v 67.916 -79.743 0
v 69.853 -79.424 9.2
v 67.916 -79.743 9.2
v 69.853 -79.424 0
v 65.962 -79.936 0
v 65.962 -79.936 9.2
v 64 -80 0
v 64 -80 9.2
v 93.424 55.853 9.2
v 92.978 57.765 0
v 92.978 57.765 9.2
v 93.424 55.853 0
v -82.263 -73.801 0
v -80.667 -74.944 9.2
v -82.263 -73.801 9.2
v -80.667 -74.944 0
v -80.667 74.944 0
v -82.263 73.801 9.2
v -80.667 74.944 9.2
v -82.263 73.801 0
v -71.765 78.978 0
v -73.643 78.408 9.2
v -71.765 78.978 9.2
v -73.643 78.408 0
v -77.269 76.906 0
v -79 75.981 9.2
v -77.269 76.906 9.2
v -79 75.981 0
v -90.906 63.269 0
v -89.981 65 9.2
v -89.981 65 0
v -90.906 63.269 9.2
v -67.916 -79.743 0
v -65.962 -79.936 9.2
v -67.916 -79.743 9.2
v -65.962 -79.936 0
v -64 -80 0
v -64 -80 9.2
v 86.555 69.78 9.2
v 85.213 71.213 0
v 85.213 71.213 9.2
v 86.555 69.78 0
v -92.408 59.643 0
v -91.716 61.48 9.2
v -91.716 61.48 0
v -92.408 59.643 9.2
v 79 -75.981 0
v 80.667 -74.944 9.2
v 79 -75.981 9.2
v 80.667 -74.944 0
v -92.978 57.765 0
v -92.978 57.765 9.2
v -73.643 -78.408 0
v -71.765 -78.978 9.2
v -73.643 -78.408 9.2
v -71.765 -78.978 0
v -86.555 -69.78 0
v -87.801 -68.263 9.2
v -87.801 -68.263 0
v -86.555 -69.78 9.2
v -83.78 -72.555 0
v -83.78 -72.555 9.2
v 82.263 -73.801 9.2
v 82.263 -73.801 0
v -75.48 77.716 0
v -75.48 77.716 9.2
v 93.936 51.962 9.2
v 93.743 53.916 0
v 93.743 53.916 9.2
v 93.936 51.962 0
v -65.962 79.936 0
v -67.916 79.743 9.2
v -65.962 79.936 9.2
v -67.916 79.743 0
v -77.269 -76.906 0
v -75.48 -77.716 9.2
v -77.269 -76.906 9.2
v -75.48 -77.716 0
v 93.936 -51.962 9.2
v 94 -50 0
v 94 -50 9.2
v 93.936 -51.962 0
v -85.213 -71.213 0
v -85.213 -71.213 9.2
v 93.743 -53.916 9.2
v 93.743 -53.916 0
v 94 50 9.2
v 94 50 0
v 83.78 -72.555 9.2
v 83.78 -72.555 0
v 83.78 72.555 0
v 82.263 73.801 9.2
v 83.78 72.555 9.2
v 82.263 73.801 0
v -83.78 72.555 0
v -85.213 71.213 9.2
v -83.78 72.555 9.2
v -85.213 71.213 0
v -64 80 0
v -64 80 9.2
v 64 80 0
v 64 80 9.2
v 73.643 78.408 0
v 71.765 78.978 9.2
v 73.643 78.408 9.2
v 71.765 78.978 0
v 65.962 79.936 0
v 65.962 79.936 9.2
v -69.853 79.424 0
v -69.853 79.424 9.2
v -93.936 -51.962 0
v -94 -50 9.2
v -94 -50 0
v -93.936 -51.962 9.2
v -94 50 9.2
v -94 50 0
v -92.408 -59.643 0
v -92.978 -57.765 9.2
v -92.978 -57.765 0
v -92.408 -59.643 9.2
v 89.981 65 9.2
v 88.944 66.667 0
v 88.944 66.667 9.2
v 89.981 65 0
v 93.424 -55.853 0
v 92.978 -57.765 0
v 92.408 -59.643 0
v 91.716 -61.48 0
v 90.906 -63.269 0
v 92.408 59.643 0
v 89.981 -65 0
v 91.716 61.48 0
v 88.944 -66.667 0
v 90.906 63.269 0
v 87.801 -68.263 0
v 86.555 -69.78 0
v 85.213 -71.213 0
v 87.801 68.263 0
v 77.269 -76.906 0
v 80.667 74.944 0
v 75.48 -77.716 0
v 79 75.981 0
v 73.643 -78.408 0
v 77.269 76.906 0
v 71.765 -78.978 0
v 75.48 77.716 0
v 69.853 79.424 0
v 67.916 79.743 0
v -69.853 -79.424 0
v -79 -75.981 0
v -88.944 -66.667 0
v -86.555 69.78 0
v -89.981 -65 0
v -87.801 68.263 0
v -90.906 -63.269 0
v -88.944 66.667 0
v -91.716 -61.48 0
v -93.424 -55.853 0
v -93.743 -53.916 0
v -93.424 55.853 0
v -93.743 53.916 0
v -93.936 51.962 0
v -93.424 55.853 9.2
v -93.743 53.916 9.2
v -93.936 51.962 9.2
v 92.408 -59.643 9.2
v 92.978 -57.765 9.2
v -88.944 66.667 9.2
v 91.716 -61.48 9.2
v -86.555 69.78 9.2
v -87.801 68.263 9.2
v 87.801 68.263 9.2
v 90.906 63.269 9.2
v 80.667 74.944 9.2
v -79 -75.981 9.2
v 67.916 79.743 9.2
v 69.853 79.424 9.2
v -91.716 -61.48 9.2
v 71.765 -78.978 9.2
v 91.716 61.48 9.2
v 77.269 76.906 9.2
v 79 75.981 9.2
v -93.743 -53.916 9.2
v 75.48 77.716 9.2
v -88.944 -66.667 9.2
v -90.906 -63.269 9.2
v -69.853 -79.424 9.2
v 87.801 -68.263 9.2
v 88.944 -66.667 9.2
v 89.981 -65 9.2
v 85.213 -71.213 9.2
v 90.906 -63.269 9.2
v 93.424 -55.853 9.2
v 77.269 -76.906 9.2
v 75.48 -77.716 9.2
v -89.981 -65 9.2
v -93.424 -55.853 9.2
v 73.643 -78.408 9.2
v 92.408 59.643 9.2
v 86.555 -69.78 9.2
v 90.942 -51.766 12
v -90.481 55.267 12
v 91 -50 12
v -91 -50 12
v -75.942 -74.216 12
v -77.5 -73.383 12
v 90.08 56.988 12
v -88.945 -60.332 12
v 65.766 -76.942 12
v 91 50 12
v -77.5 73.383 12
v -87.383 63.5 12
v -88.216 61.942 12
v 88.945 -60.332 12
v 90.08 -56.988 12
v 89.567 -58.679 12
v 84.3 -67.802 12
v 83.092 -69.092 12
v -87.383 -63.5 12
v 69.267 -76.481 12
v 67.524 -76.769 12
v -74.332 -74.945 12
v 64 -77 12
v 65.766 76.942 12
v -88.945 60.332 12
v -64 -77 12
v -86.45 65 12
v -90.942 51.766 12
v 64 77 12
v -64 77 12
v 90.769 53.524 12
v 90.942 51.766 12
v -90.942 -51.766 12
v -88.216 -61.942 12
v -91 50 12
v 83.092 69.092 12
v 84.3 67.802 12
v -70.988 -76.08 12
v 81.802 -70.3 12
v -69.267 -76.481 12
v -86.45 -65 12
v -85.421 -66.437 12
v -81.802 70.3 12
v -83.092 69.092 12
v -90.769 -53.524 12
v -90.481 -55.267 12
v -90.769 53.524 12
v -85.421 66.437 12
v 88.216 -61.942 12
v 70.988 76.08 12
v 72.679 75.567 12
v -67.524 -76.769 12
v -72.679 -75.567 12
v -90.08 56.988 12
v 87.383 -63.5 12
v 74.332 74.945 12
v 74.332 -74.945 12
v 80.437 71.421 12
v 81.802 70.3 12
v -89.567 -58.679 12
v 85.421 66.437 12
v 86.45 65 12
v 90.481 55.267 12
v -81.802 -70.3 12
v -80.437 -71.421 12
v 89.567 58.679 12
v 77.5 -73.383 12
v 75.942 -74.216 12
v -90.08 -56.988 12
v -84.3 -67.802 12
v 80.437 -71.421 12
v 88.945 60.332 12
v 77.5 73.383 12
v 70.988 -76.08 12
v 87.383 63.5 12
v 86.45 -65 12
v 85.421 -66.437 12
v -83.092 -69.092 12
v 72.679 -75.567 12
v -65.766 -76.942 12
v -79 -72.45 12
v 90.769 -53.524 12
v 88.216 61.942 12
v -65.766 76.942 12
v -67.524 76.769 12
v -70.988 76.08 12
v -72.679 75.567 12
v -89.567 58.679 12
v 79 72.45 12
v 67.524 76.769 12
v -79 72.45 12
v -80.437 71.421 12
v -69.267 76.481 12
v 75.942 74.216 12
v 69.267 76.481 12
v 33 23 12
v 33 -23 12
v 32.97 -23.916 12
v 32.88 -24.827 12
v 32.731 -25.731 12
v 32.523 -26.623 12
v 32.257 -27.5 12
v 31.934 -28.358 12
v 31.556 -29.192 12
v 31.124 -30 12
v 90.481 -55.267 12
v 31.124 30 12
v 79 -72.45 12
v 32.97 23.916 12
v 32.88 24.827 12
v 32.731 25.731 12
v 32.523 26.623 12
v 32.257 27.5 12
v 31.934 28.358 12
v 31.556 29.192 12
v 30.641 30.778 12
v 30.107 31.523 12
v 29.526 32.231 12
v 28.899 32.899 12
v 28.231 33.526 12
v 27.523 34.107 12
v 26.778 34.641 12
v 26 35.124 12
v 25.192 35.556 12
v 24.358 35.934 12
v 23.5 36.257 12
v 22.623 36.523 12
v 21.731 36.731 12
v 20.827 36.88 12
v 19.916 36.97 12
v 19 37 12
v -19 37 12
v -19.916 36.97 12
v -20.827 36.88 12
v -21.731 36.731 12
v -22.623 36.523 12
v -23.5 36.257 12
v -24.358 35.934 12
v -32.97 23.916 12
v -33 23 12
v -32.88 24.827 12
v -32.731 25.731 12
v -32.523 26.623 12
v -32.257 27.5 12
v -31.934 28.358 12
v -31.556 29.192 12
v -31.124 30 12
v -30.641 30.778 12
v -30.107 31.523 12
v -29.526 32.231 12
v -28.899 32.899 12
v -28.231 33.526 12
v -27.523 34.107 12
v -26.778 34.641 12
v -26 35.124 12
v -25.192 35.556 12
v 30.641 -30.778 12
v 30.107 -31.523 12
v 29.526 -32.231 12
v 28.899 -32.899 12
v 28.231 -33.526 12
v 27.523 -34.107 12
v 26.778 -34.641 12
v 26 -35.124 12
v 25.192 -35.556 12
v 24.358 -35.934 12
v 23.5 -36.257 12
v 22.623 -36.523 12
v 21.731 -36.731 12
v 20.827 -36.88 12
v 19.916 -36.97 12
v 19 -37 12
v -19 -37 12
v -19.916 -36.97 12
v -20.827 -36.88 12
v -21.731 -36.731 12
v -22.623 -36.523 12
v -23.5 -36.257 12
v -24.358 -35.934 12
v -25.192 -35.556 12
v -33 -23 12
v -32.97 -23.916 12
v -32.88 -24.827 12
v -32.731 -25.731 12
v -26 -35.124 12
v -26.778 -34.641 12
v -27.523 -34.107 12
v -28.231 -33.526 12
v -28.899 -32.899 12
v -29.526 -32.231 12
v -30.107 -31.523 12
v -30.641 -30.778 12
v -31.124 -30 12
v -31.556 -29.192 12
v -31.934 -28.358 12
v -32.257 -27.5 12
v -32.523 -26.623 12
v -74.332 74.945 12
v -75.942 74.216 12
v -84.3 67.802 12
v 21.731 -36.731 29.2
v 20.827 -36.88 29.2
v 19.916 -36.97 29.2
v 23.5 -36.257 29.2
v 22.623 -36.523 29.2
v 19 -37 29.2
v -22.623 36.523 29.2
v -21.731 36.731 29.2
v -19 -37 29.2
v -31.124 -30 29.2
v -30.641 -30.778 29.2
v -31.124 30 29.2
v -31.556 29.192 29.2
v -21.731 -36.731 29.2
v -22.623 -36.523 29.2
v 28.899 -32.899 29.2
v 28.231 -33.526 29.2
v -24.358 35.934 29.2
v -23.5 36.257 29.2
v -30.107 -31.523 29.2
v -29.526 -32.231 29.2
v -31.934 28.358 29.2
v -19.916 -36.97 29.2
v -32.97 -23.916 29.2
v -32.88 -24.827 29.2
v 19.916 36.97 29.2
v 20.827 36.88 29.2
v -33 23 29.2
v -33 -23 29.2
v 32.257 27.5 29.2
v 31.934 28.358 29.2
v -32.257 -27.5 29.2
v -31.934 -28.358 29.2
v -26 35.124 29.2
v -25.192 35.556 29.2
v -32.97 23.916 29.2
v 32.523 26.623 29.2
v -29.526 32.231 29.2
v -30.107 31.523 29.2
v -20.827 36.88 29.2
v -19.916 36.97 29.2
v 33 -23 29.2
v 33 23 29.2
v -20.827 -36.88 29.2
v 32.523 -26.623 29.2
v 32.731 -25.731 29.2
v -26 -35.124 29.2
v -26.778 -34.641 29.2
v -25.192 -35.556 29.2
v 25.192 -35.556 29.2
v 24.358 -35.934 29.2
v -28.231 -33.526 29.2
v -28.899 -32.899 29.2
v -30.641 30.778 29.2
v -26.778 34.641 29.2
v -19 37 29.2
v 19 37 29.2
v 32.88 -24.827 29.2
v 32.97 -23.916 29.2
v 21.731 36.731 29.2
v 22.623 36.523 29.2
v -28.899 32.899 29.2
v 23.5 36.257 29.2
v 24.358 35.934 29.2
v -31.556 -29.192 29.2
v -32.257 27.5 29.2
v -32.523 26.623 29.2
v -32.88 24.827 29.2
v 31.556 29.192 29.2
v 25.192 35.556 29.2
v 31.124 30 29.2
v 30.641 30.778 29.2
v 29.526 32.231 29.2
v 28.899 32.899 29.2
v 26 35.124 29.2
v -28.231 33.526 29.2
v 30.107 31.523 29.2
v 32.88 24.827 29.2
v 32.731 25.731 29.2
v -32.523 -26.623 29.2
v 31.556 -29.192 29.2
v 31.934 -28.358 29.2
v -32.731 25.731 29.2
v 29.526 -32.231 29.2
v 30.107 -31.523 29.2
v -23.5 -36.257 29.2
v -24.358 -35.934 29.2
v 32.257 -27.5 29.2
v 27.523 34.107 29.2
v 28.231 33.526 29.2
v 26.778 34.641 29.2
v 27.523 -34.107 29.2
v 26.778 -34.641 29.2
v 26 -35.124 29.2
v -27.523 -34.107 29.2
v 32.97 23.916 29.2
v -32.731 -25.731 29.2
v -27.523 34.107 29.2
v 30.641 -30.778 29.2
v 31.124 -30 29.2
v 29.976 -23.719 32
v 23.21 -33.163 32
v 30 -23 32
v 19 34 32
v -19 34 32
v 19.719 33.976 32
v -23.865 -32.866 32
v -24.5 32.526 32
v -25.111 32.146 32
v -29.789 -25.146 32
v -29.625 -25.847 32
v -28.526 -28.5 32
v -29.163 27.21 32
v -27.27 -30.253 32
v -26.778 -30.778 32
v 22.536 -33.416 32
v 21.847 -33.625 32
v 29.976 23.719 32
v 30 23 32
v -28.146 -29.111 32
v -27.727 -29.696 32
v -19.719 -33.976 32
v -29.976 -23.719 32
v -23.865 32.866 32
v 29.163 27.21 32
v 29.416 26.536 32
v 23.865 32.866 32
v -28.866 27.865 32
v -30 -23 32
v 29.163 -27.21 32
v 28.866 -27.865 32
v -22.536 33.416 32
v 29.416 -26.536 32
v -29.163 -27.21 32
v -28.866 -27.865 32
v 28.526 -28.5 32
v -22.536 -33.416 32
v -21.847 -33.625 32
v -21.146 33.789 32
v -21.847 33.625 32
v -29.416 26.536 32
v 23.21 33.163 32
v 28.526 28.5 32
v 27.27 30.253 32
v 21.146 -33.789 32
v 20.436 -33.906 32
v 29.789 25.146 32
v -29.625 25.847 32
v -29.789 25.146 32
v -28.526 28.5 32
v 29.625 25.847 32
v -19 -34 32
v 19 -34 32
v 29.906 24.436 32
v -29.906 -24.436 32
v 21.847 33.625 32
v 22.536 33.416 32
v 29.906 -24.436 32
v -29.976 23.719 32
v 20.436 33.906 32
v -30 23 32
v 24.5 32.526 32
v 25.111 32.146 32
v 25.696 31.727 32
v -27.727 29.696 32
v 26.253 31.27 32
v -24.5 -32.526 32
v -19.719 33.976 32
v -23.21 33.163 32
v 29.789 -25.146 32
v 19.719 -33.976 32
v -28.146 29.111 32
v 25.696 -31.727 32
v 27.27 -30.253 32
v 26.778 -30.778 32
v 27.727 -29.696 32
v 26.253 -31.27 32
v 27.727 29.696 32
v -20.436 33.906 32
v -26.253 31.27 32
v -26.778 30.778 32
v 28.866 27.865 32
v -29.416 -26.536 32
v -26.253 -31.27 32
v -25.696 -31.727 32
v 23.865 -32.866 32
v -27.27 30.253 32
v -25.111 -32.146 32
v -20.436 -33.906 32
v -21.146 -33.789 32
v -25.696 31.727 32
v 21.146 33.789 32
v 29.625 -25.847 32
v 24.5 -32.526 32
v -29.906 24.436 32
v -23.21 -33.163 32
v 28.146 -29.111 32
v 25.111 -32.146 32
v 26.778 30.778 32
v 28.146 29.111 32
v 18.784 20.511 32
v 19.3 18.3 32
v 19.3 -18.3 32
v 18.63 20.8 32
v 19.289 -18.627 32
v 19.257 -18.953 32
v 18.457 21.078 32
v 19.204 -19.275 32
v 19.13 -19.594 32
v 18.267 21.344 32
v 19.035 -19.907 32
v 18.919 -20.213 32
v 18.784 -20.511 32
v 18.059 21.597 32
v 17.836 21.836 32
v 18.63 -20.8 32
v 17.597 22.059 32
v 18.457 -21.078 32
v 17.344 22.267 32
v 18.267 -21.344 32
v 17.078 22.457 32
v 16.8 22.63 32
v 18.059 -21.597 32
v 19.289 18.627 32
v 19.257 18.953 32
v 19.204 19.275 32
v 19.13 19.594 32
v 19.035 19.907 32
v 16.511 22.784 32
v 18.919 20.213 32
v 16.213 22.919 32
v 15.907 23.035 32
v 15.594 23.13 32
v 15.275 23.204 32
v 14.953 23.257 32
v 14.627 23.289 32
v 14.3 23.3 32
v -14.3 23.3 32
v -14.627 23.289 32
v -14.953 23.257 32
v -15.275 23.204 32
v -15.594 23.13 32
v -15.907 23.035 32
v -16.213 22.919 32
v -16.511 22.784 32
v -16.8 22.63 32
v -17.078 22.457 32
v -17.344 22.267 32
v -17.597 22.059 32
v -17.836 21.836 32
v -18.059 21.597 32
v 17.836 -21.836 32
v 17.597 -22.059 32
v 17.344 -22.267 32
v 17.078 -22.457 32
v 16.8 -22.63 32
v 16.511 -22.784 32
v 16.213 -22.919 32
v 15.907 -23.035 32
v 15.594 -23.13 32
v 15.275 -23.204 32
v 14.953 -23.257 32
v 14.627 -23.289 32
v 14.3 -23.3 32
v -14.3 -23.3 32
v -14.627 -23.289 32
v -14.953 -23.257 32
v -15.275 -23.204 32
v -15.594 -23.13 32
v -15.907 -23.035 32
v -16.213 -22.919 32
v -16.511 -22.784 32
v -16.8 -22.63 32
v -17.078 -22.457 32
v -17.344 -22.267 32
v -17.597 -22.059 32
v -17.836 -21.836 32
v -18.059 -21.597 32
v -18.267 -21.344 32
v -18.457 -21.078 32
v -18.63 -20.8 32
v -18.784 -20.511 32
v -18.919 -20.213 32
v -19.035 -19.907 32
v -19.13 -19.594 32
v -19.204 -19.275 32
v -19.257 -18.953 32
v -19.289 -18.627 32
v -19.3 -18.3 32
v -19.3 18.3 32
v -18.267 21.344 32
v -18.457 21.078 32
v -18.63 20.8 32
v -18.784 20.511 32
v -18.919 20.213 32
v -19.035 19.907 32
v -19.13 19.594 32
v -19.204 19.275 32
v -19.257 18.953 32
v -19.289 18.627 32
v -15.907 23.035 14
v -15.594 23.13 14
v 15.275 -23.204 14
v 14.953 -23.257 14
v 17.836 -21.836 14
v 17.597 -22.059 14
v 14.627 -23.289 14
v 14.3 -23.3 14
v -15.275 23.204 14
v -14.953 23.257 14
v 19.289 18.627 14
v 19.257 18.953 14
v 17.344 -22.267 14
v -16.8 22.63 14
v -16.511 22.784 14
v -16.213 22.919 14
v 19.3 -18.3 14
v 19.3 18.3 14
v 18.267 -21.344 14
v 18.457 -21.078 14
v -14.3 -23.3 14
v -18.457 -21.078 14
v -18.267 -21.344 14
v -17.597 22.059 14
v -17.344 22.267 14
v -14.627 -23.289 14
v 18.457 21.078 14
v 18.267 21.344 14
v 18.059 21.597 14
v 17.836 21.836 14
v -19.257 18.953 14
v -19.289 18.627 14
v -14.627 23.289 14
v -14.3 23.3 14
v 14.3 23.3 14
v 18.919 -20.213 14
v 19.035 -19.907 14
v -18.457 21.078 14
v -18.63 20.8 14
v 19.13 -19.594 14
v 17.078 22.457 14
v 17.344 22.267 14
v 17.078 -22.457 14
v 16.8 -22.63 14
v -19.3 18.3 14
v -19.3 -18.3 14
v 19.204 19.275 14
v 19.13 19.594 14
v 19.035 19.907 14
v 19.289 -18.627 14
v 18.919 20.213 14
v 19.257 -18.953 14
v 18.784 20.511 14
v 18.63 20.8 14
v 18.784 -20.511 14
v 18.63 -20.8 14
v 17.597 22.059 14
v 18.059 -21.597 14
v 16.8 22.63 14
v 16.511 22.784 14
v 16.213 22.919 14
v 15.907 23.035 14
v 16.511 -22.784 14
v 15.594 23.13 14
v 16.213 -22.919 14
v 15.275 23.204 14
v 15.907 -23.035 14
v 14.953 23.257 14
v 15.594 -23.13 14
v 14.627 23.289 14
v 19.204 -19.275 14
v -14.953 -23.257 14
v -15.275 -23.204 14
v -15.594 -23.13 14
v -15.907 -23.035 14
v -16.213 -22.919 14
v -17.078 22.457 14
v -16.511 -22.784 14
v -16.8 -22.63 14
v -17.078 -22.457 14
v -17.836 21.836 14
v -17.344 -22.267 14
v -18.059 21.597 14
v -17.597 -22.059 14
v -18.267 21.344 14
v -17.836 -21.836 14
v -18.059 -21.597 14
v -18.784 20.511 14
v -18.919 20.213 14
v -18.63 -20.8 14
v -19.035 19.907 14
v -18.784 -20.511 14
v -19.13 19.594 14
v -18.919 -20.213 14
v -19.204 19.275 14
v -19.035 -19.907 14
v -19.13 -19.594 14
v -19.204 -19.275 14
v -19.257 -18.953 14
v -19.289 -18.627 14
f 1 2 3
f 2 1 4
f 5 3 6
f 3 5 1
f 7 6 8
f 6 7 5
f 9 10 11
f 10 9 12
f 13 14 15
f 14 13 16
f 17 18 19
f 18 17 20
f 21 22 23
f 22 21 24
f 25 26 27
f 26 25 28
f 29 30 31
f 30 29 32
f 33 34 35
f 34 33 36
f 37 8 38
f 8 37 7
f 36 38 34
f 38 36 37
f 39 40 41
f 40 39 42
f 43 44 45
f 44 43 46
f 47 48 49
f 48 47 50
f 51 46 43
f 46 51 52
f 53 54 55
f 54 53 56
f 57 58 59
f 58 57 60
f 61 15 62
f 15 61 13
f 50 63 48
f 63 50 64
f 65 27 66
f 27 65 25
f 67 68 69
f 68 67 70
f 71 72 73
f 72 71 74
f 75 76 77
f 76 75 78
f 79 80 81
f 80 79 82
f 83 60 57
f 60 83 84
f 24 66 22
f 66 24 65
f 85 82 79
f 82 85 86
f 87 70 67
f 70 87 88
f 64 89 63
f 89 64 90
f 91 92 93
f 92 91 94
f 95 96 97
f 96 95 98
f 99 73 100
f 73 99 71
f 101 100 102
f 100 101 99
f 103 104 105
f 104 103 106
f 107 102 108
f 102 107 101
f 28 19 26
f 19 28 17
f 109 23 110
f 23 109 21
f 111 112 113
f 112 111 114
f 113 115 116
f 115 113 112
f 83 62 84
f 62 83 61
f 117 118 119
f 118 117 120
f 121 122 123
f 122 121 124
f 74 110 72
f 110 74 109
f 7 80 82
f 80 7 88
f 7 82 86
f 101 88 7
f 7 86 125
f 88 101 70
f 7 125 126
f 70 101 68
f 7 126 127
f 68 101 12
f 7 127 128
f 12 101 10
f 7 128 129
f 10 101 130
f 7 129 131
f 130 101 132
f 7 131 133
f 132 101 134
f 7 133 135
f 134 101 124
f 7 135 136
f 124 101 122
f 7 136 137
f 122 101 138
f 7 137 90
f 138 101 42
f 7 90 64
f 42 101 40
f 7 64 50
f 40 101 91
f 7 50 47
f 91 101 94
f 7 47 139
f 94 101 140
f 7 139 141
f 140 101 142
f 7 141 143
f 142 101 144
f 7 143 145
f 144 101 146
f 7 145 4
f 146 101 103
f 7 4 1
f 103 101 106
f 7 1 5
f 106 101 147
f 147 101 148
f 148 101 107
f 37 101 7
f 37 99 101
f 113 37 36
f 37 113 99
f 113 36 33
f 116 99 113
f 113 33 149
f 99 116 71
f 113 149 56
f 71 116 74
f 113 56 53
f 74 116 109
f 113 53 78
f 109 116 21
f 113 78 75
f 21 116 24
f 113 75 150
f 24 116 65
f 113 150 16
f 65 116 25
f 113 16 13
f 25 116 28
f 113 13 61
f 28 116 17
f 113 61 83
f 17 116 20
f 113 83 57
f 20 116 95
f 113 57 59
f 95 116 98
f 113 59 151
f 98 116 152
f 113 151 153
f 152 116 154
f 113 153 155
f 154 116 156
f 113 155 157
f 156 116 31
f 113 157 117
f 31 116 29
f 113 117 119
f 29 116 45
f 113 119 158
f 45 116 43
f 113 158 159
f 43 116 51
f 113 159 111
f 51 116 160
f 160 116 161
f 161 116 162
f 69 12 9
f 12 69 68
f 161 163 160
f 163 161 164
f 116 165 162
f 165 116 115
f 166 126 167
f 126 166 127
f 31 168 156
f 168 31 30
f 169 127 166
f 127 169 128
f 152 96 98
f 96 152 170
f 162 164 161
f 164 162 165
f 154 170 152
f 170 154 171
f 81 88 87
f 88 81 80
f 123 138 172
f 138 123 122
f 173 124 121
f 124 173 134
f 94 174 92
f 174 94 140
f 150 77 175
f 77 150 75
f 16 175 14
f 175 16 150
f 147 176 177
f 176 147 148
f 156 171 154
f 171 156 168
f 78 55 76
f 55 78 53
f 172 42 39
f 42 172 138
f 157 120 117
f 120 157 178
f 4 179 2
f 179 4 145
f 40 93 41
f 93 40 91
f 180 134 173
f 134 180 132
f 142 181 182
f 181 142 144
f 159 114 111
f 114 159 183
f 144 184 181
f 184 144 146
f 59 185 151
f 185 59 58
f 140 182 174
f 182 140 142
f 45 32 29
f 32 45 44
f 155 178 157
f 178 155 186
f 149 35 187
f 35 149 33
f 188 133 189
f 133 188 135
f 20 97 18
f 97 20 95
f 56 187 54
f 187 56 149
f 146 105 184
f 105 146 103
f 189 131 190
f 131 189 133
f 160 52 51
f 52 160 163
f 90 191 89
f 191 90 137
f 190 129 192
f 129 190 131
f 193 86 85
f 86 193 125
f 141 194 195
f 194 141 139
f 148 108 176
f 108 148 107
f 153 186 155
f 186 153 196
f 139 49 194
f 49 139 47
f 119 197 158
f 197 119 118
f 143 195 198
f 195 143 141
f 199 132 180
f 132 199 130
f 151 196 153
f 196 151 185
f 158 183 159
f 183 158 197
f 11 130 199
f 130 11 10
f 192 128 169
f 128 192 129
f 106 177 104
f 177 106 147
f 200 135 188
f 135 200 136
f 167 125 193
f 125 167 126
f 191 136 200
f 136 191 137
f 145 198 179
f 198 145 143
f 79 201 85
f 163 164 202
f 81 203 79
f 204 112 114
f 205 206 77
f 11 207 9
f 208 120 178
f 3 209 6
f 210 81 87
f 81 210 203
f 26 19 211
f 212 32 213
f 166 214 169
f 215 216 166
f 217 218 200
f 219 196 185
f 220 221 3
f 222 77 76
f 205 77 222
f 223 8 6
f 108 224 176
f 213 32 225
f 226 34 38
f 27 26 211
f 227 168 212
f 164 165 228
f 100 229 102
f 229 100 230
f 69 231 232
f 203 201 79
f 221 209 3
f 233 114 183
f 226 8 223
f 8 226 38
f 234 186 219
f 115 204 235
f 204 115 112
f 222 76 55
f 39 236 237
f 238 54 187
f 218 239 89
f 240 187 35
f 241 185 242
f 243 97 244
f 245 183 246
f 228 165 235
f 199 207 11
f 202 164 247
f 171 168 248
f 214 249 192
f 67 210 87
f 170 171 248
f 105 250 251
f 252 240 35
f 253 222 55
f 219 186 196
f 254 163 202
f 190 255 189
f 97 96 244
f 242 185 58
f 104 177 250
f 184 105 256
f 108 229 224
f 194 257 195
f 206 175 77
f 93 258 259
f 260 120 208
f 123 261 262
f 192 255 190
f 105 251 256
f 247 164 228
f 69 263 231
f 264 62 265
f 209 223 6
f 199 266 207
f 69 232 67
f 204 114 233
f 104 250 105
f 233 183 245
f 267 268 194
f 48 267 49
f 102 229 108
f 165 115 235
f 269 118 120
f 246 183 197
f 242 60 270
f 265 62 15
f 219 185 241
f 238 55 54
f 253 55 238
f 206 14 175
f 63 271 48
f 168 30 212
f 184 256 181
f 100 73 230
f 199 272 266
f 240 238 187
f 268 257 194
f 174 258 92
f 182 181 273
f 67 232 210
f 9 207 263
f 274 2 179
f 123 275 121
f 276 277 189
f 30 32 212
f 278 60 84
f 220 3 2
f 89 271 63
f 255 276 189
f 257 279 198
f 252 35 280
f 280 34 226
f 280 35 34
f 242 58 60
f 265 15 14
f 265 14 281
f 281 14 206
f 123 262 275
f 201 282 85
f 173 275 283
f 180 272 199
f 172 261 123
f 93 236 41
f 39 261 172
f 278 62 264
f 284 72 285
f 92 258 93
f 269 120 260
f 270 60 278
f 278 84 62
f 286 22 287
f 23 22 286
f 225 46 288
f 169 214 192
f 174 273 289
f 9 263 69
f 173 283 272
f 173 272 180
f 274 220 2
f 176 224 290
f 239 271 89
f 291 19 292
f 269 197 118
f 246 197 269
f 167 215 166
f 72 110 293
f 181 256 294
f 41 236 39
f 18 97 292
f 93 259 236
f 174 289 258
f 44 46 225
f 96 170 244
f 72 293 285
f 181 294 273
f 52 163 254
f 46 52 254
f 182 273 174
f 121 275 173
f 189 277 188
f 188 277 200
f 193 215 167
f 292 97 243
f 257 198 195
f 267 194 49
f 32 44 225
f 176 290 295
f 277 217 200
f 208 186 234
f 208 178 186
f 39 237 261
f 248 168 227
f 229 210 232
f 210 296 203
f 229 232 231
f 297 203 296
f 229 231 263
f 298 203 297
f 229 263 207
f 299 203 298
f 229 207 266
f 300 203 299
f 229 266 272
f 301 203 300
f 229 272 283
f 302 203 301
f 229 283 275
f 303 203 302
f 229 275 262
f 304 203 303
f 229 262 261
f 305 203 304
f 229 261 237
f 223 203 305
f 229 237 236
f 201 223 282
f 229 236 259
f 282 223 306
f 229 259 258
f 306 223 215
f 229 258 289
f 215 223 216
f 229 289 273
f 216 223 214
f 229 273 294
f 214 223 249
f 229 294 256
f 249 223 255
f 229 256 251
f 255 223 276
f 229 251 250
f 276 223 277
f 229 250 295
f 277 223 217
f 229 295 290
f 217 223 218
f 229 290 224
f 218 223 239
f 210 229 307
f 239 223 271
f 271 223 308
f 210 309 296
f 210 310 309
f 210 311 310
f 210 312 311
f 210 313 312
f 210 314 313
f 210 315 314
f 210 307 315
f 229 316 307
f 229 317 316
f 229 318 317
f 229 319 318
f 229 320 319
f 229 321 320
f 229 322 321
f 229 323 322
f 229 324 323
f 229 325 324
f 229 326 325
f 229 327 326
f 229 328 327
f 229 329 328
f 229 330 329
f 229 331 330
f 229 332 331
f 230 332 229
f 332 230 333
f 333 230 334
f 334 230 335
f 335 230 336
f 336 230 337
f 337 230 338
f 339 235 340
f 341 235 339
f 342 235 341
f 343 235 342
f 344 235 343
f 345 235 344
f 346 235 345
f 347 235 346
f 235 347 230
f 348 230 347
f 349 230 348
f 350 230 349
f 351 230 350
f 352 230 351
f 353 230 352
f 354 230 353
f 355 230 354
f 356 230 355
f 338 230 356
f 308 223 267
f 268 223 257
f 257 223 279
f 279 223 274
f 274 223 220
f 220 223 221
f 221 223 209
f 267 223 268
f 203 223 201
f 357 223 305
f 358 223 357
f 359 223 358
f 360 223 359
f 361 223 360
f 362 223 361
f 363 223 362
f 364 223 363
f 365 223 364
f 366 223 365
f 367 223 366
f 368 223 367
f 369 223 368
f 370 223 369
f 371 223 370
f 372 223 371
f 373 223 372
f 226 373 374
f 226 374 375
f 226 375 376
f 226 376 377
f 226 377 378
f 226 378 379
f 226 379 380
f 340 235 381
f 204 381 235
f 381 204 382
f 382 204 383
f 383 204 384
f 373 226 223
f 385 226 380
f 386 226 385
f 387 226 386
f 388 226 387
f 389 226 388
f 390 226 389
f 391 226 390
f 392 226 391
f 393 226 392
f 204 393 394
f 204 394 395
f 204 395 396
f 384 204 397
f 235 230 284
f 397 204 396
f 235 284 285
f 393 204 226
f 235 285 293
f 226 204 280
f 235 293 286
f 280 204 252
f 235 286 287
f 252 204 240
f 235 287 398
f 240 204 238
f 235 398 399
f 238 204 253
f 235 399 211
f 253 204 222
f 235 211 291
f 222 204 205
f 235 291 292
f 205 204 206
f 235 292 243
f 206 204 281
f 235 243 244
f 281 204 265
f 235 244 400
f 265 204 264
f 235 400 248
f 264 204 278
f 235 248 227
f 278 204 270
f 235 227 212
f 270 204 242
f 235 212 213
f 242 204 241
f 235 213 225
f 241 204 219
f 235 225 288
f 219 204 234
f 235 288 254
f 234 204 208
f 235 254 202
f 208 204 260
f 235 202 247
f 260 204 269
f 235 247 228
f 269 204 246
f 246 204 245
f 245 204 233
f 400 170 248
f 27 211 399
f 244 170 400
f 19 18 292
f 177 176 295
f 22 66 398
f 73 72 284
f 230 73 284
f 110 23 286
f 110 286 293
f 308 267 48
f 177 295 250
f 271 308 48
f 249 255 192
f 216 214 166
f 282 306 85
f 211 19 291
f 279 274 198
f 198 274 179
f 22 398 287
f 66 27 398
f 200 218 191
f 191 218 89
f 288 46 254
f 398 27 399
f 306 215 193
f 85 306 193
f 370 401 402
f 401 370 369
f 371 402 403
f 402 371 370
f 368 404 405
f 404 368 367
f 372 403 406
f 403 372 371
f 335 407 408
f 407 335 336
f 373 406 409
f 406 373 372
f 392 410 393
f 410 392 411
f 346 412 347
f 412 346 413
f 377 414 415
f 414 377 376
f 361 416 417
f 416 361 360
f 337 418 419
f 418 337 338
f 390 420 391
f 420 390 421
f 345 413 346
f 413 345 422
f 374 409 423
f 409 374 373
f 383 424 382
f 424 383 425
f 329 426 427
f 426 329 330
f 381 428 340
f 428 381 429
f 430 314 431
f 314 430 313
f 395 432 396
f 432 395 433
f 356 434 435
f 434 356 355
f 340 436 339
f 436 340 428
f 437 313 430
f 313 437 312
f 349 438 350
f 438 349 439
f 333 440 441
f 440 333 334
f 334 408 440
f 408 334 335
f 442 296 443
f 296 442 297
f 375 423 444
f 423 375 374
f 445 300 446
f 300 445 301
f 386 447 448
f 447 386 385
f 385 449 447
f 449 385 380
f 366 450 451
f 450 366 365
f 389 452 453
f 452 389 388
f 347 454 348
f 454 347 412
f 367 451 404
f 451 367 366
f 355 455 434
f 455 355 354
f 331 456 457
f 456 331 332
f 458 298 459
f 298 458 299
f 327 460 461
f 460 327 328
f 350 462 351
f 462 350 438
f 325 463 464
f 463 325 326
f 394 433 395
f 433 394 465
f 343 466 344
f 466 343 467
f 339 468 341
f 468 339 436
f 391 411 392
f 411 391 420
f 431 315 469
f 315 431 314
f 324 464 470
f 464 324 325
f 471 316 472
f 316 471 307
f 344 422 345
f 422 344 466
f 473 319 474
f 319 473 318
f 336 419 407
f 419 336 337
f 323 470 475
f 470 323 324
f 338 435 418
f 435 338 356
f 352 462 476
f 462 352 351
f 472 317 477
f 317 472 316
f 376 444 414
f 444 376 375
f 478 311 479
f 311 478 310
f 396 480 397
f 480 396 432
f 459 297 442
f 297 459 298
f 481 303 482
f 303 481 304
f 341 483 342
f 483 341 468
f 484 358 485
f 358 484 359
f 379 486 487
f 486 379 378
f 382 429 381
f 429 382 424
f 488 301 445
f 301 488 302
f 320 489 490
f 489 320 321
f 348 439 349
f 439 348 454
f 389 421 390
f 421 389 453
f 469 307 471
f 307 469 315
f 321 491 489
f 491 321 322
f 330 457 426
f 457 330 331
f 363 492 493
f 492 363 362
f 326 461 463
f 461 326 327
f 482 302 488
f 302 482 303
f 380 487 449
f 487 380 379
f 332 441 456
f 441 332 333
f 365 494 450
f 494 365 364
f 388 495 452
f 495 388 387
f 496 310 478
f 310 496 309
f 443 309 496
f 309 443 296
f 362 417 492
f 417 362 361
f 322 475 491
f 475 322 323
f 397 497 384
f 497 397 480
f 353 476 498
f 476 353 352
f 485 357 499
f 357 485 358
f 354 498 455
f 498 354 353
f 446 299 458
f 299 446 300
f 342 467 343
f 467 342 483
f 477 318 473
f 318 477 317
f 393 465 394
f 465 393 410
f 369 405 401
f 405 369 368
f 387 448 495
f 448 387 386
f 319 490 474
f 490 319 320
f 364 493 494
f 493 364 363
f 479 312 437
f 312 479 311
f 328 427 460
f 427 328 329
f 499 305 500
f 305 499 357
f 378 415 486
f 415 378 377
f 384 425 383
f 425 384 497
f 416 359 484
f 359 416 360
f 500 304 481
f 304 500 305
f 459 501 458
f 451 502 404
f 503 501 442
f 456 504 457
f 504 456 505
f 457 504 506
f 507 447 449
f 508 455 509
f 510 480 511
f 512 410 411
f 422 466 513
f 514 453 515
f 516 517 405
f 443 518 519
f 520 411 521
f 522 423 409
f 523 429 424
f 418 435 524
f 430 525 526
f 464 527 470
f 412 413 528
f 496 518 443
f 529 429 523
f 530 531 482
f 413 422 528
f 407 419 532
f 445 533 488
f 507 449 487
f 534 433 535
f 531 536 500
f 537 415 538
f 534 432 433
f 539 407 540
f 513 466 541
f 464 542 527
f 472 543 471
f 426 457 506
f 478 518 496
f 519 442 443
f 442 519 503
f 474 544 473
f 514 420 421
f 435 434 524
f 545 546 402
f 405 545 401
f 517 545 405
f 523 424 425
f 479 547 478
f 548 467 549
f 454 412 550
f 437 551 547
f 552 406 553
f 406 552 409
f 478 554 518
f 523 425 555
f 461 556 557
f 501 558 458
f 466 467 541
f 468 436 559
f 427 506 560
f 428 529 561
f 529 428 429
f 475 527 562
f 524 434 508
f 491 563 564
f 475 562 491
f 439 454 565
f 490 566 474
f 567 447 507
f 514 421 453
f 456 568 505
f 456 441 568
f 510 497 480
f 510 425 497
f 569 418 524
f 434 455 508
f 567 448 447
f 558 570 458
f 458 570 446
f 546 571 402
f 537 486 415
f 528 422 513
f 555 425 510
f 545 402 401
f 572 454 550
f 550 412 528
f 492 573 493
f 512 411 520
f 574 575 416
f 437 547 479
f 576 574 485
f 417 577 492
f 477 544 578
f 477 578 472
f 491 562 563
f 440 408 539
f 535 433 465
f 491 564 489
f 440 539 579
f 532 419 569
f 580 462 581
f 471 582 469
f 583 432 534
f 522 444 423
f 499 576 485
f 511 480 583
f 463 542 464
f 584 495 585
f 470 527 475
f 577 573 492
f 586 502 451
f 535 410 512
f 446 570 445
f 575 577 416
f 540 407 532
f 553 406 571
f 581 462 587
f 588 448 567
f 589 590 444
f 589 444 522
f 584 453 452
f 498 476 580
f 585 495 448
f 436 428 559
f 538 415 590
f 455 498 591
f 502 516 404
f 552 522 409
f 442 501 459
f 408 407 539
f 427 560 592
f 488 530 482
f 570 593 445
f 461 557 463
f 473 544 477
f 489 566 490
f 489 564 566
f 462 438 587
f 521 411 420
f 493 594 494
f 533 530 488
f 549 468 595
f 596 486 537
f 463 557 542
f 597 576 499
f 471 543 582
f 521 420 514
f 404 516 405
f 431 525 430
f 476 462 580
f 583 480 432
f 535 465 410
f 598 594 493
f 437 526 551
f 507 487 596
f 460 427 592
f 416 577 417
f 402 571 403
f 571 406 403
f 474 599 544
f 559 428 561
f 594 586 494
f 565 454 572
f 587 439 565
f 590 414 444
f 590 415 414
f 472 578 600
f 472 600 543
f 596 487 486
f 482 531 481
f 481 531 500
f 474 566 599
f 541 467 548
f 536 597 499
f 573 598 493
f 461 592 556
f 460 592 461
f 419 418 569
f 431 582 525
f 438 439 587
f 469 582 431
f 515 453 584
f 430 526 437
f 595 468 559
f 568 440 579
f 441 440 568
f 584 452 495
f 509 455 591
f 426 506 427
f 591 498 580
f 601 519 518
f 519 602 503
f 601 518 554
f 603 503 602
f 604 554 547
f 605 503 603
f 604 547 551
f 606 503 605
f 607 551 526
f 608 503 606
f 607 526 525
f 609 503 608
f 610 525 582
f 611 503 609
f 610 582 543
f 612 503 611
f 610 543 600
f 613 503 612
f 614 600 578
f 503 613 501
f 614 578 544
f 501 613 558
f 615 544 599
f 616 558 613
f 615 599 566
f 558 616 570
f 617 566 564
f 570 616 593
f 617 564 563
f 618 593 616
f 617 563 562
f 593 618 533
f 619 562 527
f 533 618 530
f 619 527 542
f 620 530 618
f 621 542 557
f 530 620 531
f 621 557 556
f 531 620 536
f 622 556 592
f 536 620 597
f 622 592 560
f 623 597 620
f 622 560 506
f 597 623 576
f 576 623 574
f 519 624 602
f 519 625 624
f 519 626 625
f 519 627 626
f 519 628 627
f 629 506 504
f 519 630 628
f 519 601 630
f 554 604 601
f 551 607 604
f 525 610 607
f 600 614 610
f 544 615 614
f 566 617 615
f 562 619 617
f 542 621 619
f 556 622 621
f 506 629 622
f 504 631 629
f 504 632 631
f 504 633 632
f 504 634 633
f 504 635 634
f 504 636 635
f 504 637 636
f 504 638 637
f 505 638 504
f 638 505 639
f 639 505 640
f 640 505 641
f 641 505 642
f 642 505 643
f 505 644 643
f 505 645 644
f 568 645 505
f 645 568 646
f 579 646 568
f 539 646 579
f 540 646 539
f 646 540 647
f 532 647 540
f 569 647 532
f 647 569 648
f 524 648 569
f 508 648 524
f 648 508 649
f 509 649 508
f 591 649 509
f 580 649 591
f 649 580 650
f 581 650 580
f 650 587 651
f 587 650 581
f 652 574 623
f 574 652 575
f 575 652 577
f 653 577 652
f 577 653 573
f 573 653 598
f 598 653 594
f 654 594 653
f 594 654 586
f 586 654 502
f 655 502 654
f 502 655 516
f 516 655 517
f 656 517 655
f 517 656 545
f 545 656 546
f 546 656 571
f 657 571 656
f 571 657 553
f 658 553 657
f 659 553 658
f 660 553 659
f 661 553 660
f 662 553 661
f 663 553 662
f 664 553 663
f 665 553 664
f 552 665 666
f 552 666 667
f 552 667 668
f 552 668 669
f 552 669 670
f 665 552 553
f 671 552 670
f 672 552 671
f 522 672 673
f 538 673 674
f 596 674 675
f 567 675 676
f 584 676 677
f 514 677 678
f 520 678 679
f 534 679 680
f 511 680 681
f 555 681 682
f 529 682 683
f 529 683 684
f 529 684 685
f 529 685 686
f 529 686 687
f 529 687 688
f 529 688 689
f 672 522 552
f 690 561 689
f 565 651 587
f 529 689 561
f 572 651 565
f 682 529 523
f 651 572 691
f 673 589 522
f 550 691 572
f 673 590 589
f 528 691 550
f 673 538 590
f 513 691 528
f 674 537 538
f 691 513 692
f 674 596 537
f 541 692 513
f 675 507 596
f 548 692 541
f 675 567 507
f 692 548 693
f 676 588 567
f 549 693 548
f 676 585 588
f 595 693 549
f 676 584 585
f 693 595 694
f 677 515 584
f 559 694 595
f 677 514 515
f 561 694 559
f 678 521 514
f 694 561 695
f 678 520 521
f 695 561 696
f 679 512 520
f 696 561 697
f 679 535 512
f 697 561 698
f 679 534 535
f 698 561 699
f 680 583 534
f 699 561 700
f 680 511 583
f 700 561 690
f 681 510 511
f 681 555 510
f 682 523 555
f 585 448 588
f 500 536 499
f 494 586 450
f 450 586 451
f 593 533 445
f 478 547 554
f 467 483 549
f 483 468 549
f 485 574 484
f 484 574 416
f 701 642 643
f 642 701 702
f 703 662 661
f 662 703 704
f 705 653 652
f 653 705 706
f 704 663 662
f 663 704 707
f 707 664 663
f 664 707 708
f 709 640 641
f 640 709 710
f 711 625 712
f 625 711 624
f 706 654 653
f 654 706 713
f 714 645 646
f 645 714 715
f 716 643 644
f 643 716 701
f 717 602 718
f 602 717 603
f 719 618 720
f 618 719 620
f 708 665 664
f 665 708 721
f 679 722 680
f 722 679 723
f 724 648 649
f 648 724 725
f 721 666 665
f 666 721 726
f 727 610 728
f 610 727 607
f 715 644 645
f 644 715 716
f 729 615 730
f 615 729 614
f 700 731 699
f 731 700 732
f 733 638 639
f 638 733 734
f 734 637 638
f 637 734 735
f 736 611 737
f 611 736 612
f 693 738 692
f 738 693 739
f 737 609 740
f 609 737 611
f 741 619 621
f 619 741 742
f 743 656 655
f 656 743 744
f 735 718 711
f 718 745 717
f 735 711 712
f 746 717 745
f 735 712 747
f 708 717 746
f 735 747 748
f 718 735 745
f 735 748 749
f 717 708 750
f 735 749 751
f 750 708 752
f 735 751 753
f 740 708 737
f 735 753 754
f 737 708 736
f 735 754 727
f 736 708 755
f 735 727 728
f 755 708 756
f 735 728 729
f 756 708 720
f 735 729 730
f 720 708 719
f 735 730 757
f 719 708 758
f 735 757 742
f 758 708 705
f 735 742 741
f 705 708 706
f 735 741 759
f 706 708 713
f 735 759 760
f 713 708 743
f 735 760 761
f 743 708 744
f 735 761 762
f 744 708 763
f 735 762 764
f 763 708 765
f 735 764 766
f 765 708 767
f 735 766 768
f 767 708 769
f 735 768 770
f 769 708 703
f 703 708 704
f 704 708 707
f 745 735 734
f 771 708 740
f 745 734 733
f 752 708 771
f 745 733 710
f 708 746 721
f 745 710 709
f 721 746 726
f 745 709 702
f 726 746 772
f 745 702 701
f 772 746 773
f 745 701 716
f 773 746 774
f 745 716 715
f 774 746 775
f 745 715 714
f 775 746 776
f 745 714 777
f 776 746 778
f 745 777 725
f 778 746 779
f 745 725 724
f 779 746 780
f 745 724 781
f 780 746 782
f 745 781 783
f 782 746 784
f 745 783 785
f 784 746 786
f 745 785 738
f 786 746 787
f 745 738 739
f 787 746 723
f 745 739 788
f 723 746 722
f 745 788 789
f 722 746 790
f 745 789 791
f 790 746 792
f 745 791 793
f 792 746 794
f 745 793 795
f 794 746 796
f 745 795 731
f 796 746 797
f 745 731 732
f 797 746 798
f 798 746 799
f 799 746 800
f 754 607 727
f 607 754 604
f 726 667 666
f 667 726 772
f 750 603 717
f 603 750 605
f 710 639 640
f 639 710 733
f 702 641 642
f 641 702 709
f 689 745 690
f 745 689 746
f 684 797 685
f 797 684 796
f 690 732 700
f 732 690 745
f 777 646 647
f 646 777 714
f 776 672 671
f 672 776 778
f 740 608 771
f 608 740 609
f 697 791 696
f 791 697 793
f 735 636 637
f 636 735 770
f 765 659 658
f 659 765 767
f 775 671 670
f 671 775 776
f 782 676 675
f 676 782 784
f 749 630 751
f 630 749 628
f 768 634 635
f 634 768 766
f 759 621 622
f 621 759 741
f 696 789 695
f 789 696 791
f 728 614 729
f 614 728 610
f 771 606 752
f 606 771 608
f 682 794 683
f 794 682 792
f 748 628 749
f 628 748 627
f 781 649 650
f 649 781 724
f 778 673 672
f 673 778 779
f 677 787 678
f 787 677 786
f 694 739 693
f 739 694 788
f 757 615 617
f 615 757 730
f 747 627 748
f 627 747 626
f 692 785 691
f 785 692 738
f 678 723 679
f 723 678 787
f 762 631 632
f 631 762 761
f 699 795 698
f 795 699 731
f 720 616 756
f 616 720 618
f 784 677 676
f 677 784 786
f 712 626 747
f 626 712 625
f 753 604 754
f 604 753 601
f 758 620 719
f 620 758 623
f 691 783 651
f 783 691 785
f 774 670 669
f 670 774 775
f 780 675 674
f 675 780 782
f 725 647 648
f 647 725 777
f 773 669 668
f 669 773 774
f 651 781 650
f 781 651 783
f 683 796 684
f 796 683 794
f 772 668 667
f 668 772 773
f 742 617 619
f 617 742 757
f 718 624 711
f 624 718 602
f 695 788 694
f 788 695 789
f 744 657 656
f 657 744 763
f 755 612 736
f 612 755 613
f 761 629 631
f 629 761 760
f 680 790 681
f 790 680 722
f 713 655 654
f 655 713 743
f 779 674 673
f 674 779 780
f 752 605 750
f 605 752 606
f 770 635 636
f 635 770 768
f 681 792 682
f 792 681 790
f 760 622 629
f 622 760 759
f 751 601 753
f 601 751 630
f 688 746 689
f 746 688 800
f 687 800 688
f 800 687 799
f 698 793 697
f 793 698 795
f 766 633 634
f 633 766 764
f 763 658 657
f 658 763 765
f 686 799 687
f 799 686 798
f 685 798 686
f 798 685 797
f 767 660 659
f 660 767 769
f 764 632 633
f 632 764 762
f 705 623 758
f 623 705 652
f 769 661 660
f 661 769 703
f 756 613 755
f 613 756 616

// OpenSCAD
// Headphone stand in three printable parts: base, post, hanger.
// No glue, no screws. Rectangular (non-round) blade tenons prevent spinning.
// All dimensions in mm. Print orientation is the exported orientation (+Z up).
//
// Assembly heights (assembly coordinates, desk at z=0):
//   base plate/boss top        0 .. 32
//   post                       14.5 .. 250  (17.5 mm of it inside the base socket)
//   hanger tenon               228.5 .. 250 (21.5 mm inside the post socket)
//   hanger saddle top centre   270
// Socket clearances: 0.3 mm per side (socket is tenon + 0.6 in each dimension),
// tenon tips stop 0.5 mm above socket floors; shoulders/faces give the depth stop
// for the hanger, and the post bottoms in its socket.

part = "base"; // [base, post, hanger, assembly]
cadverify_only = "";

$fn = 96;

/* [Base] */
base_w = 188;          // desk footprint, X
base_d = 160;          // desk footprint, Y
base_plate_top = 9;    // straight plate wall up to here, then 45 deg chamfer to 12
base_top_plate = 12;
boss_w = 66;
boss_d = 74;
boss_straight_top = 29; // then 45 deg chamfer to boss_top
boss_top = 32;
base_socket_w = 38.6;  // post 38 + 0.6
base_socket_d = 46.6;  // post 46 + 0.6
base_socket_floor = 14;

/* [Post] */
post_w = 38;
post_d = 46;
post_len = 235.5;      // tip (local z=0) to top (assembly 250)
post_top_socket_w = 24.6; // hanger tenon 24 + 0.6
post_top_socket_d = 34.6; // hanger tenon 34 + 0.6
post_top_socket_floor_local = 213.5; // assembly 228

/* [Hanger, modelled in print coordinates] */
// Print coordinates: X = saddle length, Y = height above tenon tip,
// Z = saddle width direction (part lies on its Z=0 side face on the bed).
hang_len_half = 69;    // overall saddle half length incl. rounded end point
hang_width = 34;       // >= 30 mm headband support width
hang_top_rel = 41.5;   // tenon tip to saddle crown; assembly 228.5 + 41.5 = 270
hang_arc_r = 170;      // crown radius of the headband contact surface
hang_plate_t = 10;     // saddle plate thickness (vertical, in profile)
hang_tenon_half_w = 12;  // tenon is 24 (X) x 34 (width)
hang_shoulder_rel = 21.5; // assembly 250, post top
hang_neck_half_w = 17;

function hang_top_z(x) = hang_top_rel - (hang_arc_r - sqrt(hang_arc_r*hang_arc_r - x*x));
function hang_bot_z(x) = hang_top_z(x) - hang_plate_t;

module rounded_rect(w, d, r) {
    offset(r = r) square([w - 2*r, d - 2*r], center = true);
}

module instance(name, part_name, unit = 1) {
    echo(cadverify_instance = [name, part_name, unit]);
    if (cadverify_only == "" || cadverify_only == name) children();
}

/* ---------- BASE (print = assembly orientation) ---------- */
module base_part() {
    difference() {
        union() {
            // desk plate with 45 deg top edge chamfer
            linear_extrude(base_plate_top) rounded_rect(base_w, base_d, 30);
            hull() {
                translate([0, 0, base_plate_top]) linear_extrude(0.2)
                    rounded_rect(base_w, base_d, 30);
                translate([0, 0, base_top_plate - 0.2]) linear_extrude(0.2)
                    rounded_rect(base_w - 6, base_d - 6, 27);
            }
            // raised boss / collar around the post socket, 45 deg top chamfer
            translate([0, 0, base_top_plate])
                linear_extrude(boss_straight_top - base_top_plate)
                    rounded_rect(boss_w, boss_d, 14);
            hull() {
                translate([0, 0, boss_straight_top]) linear_extrude(0.2)
                    rounded_rect(boss_w, boss_d, 14);
                translate([0, 0, boss_top - 0.2]) linear_extrude(0.2)
                    rounded_rect(boss_w - 6, boss_d - 6, 11);
            }
        }
        // blind rectangular socket for the post (stops post spinning)
        translate([0, 0, base_socket_floor])
            linear_extrude(boss_top - base_socket_floor + 2)
                rounded_rect(base_socket_w, base_socket_d, 5);
    }
}

/* ---------- POST (printed upright, local z=0 is tenon tip) ---------- */
module post_part() {
    difference() {
        linear_extrude(post_len) rounded_rect(post_w, post_d, 8);
        // blind rectangular socket in the top for the hanger blade tenon
        translate([0, 0, post_top_socket_floor_local])
            linear_extrude(post_len - post_top_socket_floor_local + 2)
                rounded_rect(post_top_socket_w, post_top_socket_d, 5);
    }
}

/* ---------- HANGER (printed on its side) ---------- */
module hanger_part() {
    top_pts    = [for (x = [56 : -8 : -56]) [x, hang_top_z(x)]];
    bot_r_pts  = [for (x = [40 : 8 : 64]) [x, hang_bot_z(x)]];
    bot_l_pts  = [for (x = [-64 : 8 : -40]) [x, hang_bot_z(x)]];
    mid64 = (hang_top_z(64) + hang_bot_z(64)) / 2;
    profile = concat(
        [[-10, 0], [10, 0], [12, 2], [12, hang_shoulder_rel],
         [hang_neck_half_w, hang_shoulder_rel], [30, hang_bot_z(30)]],
        bot_r_pts,
        [[hang_len_half - 0.5, mid64], [64, hang_top_z(64)]],
        top_pts,
        [[-64, hang_top_z(64)], [-(hang_len_half - 0.5), mid64], [-64, hang_bot_z(64)]],
        bot_l_pts,
        [[-30, hang_bot_z(30)], [-hang_neck_half_w, hang_shoulder_rel],
         [-hang_tenon_half_w, hang_shoulder_rel], [-12, 2]]
    );
    difference() {
        linear_extrude(hang_width) polygon(profile);
        // 45 deg chamfers on the two crown side edges, centre contact zone only.
        // Plane (print coords): Z + Y = 38.5 + 34 on the far side ...
        translate([0, 38.5, hang_width]) rotate([-45, 0, 0])
            translate([-85, -40, 0]) cube([170, 80, 40]);
        // ... and Z - Y = -38.5 on the bed side.
        translate([0, 38.5, 0]) rotate([45, 0, 0])
            translate([-85, -40, -40]) cube([170, 80, 40]);
    }
}

/* ---------- Spec echoes ---------- */
if (part == "base") {
    echo(cadverify_spec = [
        ["bounds", [[-base_w/2, -base_d/2, 0], [base_w/2, base_d/2, boss_top]]],
        ["bodies", 1],
        ["through_holes", 0],
        ["support_faces", [["desk", "-z", 25000]]],
        ["overhangs_allowed", []],
        ["copies", 1],
        ["details", [
            ["plate", "material", [[-80, -60, 2], [80, 60, 10]], 0.99],
            ["boss_wall", "material", [[22, -30, 16], [31, 30, 28]], 0.99],
            ["post_socket", "void", [[-17, -21, 16], [17, 21, 30]], 0.99],
            ["socket_floor", "thickness", [0, 0, 42], [0, 0, -1], base_socket_floor],
            ["boss_socket_top", "view", [[-34, -38, 27], [34, 38, boss_top]]]
        ]]
    ]);
} else if (part == "post") {
    echo(cadverify_spec = [
        ["bounds", [[-post_w/2, -post_d/2, 0], [post_w/2, post_d/2, post_len]]],
        ["bodies", 1],
        ["through_holes", 0],
        ["support_faces", [["bed", "-z", 1500]]],
        ["overhangs_allowed", []],
        ["copies", 1],
        ["details", [
            ["column", "material", [[-16, -20, 30], [16, 20, 200]], 0.99],
            ["hanger_socket", "void", [[-10, -15, 216], [10, 15, 234]], 0.99],
            ["column_width", "thickness", [32, 0, 100], [-1, 0, 0], post_w],
            ["top_socket", "view", [[-19, -23, 210], [19, 23, post_len]]]
        ]]
    ]);
} else if (part == "hanger") {
    // actual extreme points are the saddle end tips at +-(hang_len_half - 0.5)
    echo(cadverify_spec = [
        ["bounds", [[-(hang_len_half - 0.5), 0, 0], [hang_len_half - 0.5, hang_top_rel, hang_width]]],
        ["bodies", 1],
        ["through_holes", 0],
        ["support_faces", [["bed", "-z", 1200]]],
        ["overhangs_allowed", [
            ["45deg crown chamfer on bed side", [[-36, 37, 0], [36, hang_top_rel, 5]]]
        ]],
        ["copies", 1],
        ["details", [
            ["saddle_plate", "material", [[-25, 32, 5], [25, 38, 29]], 0.99],
            ["tenon", "material", [[-10, 2, 5], [10, 20, 29]], 0.99],
            ["saddle_thickness", "thickness", [50, 52, 17], [0, -1, 0], hang_plate_t],
            ["rounded_crown", "view", [[-40, 27, 0], [40, hang_top_rel, hang_width]]]
        ]]
    ]);
} else if (part == "assembly") {
    echo(cadverify_spec = [
        ["bounds", [[-base_w/2, -base_d/2, 0], [base_w/2, base_d/2, 270]]],
        ["support_faces", [["desk", "-z", 25000]]],
        ["allowed_interferences", []],
        ["assembly_order", [
            [["base"], [0, 0, 0]],
            [["post"], [0, 0, -1]],
            [["hanger"], [0, 0, -1]]
        ]]
    ]);
}

/* ---------- Output ---------- */
if (part == "base") {
    base_part();
} else if (part == "post") {
    post_part();
} else if (part == "hanger") {
    hanger_part();
} else if (part == "assembly") {
    instance("base", "base") base_part();
    instance("post", "post") translate([0, 0, 14.5]) post_part();
    // hanger print coords (x, y=height, z=width) -> assembly (x, z-17, 270-y)
    instance("hanger", "hanger")
        translate([0, -hang_width/2, 270]) rotate([-90, 0, 0]) hanger_part();
} else {
    assert(false, str("unknown part: ", part));
}
